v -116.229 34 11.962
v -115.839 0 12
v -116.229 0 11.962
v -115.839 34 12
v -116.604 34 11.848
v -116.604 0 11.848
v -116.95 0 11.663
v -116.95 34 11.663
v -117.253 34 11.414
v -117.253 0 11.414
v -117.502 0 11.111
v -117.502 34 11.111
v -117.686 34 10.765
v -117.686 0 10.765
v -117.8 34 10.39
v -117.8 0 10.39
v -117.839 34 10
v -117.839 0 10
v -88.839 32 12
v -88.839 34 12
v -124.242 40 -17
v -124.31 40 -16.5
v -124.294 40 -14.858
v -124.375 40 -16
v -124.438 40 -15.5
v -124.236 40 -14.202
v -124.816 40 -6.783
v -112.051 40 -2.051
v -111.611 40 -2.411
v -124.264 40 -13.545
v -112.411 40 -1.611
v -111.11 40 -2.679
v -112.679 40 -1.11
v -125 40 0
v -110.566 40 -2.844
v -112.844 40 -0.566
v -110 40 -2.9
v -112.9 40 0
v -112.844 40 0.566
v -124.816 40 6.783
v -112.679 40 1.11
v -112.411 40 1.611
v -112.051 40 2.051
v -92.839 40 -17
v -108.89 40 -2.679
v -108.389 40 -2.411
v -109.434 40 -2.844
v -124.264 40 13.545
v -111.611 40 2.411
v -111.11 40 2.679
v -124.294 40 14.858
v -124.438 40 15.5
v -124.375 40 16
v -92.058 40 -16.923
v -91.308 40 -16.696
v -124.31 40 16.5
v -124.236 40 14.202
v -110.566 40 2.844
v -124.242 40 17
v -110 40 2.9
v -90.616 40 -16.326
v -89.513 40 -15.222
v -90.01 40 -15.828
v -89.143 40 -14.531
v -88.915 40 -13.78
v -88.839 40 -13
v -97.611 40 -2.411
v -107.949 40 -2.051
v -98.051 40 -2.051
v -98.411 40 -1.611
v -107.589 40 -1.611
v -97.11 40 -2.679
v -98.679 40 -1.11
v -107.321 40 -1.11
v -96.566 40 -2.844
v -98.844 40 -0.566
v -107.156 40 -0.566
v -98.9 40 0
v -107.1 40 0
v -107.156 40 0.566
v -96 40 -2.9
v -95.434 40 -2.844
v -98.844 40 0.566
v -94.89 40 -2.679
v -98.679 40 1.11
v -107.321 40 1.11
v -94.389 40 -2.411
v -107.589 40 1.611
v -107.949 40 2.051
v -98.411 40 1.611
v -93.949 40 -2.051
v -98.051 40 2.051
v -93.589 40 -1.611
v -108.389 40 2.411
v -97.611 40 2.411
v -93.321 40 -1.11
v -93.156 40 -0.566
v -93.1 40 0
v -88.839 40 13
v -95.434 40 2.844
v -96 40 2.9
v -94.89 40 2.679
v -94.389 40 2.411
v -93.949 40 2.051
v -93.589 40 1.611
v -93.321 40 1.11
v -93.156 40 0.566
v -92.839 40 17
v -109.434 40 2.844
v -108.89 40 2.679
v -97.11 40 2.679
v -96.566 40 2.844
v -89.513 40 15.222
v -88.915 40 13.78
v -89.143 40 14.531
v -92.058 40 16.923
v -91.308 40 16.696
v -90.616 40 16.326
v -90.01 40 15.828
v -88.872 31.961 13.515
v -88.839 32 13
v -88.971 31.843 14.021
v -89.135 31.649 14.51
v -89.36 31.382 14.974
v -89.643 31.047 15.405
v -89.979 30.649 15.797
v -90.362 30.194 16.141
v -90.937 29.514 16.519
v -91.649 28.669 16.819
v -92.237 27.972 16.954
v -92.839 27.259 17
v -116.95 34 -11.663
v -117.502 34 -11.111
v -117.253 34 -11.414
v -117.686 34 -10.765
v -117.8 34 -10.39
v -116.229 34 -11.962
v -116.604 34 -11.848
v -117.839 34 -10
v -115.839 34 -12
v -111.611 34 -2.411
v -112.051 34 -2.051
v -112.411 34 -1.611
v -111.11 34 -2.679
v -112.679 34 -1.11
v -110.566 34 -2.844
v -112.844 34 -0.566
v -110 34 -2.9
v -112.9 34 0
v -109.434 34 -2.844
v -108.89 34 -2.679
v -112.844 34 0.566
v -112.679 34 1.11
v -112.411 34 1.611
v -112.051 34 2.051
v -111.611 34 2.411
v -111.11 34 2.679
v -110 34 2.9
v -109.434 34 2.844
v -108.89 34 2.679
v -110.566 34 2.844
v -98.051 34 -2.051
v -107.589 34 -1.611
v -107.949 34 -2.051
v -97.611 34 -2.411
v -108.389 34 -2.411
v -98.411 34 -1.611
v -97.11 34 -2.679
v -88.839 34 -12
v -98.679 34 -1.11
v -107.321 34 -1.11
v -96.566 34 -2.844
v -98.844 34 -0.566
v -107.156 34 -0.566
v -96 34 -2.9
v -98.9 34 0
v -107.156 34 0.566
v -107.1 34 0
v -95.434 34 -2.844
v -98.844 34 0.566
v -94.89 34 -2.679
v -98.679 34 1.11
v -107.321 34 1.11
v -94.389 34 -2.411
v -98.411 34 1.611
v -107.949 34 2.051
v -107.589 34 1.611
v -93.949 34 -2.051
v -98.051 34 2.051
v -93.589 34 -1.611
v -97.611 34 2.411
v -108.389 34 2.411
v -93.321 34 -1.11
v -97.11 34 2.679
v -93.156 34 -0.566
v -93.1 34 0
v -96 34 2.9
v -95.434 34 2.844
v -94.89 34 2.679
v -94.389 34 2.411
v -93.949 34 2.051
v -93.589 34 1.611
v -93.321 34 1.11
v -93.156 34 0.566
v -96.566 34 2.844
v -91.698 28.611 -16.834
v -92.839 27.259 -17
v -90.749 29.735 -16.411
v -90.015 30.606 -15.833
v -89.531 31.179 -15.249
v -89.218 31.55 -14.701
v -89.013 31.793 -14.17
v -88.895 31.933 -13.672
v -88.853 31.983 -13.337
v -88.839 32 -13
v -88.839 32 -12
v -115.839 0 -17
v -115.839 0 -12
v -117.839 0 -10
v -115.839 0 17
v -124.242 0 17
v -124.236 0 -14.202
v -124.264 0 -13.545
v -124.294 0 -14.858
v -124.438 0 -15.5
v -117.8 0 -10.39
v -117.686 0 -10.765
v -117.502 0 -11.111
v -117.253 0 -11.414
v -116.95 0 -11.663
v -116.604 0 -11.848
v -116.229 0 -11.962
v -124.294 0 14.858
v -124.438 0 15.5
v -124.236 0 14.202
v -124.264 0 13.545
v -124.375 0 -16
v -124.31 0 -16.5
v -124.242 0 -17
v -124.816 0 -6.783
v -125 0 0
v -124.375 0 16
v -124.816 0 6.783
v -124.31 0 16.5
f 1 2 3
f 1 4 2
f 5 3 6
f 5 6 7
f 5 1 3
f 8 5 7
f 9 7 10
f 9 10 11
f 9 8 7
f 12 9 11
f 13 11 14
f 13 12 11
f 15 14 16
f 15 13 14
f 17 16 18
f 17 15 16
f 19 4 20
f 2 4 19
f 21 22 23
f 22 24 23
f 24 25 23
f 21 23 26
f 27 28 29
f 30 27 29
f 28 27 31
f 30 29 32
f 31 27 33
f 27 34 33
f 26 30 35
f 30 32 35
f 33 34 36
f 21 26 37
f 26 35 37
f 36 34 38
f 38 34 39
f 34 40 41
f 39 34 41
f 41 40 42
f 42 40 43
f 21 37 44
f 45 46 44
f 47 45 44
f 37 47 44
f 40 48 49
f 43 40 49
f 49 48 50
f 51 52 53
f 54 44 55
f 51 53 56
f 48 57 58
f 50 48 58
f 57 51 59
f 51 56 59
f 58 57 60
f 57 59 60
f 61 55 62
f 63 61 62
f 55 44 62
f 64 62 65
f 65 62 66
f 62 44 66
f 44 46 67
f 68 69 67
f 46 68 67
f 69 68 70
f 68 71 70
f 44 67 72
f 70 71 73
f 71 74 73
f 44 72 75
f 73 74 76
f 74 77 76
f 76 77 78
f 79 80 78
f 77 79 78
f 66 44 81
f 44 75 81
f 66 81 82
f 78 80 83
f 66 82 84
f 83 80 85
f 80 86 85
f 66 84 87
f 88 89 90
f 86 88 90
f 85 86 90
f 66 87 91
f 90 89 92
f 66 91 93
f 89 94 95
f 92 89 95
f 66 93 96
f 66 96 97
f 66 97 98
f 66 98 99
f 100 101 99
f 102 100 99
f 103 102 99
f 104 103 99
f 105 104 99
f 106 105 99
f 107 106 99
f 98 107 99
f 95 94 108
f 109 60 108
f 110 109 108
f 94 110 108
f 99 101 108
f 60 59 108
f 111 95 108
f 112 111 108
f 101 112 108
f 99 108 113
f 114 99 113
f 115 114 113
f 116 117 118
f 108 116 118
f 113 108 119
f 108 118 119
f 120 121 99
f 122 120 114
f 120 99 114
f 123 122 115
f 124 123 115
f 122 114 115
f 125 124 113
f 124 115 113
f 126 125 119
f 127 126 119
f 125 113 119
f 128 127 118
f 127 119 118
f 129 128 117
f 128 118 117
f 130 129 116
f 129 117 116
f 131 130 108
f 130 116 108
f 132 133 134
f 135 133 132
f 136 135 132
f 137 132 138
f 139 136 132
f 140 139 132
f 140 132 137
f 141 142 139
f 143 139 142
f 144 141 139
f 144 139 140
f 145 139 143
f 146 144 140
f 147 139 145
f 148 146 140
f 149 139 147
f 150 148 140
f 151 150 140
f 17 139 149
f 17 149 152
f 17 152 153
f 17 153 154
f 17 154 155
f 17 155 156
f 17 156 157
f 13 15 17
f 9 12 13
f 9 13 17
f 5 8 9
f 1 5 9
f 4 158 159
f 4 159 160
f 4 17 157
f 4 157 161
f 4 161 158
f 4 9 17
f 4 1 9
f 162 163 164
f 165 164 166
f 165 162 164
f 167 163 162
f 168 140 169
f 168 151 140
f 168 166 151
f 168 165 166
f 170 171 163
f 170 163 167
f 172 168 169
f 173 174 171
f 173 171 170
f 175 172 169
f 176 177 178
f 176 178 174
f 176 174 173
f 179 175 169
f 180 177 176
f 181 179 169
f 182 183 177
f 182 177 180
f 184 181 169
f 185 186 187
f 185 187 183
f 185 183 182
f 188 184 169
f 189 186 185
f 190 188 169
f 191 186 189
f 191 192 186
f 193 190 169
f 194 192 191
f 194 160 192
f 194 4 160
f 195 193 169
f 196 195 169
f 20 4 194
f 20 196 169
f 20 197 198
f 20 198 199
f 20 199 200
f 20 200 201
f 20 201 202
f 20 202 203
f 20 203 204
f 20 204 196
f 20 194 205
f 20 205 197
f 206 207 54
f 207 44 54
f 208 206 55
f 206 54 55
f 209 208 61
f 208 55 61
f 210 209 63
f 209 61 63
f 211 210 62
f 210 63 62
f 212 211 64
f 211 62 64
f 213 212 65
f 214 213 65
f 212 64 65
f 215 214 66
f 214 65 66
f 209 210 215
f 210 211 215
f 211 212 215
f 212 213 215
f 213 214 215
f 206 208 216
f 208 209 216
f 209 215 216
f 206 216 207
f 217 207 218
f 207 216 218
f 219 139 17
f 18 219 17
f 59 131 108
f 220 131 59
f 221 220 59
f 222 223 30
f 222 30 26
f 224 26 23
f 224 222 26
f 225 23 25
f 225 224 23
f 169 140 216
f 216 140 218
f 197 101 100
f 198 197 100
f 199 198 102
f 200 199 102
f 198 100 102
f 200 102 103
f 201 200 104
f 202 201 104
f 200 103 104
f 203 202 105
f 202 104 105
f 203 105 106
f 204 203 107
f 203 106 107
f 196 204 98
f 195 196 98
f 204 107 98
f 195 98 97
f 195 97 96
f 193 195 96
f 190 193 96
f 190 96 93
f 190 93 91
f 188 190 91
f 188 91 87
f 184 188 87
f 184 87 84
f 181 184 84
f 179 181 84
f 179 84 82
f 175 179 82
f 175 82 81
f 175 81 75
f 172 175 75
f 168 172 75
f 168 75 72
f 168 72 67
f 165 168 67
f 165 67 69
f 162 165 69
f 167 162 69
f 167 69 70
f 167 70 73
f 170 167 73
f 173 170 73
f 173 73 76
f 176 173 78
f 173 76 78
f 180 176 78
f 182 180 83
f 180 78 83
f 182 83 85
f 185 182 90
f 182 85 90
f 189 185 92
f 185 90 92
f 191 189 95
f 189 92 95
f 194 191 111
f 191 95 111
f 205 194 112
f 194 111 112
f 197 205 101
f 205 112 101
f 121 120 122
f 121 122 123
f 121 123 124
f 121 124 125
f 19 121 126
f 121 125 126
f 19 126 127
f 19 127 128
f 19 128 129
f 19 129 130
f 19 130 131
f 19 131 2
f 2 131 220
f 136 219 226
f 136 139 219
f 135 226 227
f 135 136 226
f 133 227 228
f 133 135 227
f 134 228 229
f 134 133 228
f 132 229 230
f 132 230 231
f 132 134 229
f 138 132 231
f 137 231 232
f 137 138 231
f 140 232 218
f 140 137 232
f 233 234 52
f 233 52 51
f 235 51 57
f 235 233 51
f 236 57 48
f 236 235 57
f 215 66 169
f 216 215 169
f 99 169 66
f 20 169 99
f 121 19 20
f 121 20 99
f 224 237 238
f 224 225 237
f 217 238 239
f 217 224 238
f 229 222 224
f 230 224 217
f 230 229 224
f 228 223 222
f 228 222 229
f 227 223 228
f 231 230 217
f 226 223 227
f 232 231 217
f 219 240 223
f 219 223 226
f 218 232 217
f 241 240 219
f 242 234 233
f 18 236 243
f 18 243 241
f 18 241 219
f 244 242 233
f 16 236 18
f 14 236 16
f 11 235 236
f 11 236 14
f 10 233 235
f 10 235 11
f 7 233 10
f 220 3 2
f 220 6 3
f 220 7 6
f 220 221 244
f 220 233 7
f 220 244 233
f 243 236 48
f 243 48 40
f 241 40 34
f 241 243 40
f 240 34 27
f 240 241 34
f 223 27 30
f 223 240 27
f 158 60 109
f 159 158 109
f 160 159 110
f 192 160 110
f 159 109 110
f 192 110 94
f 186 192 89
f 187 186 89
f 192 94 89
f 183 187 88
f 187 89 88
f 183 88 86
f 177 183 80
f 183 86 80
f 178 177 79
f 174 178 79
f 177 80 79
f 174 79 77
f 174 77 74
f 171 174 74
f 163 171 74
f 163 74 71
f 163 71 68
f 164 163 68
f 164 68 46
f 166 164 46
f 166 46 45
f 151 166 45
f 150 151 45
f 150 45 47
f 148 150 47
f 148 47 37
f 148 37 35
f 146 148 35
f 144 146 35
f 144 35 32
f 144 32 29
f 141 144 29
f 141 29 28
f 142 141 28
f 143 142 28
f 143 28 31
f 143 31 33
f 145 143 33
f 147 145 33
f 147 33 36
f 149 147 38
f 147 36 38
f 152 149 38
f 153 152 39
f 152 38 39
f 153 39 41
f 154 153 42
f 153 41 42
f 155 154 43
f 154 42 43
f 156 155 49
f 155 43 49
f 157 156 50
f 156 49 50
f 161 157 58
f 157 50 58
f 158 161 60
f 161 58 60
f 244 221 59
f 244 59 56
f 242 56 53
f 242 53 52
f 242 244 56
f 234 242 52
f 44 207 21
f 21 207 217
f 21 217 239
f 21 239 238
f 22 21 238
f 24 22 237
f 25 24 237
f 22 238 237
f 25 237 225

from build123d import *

# Parameters (mm, degrees)
BOSS_EXTRUDE1_DEPTH = 40
CUT_EXTRUDE1_REACH  = 137.577
SKETCH3_W           = 29
SKETCH3_H           = 24
CUT_EXTRUDE2_DEPTH  = 34
SKETCH6_R           = 2.9
CUT_EXTRUDE3_DEPTH  = 31
FILLET2_R           = 4
BOSS_EXTRUDE3_START = -40
BOSS_EXTRUDE3_DEPTH = 40
FILLET4_R           = 5
FILLET5_R           = 2


with BuildPart() as part:
    # Sketch1 → Boss-Extrude1 (new body)
    with BuildSketch(Plane(origin=(0, 0, 0), x_dir=(1, 0, 0), z_dir=(0, 1, 0))):
        with BuildLine():
            Line((-123.838604643, 17), (-88.838604643, 17))
            Line((-88.838604643, 17), (-88.838604643, -17))
            Line((-88.838604643, -17), (-123.838604643, -17))
            ThreePointArc((-123.838604643, -17), (-125, 0), (-123.838604643, 17))
        make_face()
    extrude(amount=BOSS_EXTRUDE1_DEPTH)

    # Sketch2 → Cut-Extrude1 (cut, up to next)
    with BuildSketch(Plane.XY.offset(17), mode=Mode.PRIVATE) as cut_extrude1_sk1:
        Polygon((-88.838604643, 0), (-88.838604643, 32), (-115.838604643, 0), align=None)
    cut_extrude1_tool1 = extrude(cut_extrude1_sk1.sketch, amount=-CUT_EXTRUDE1_REACH, mode=Mode.PRIVATE) & part.part
    add(cut_extrude1_tool1.solids().sort_by_distance((-97.838605, 10.666667, 17))[0], mode=Mode.SUBTRACT)

    # Sketch3 → Cut-Extrude2 (cut)
    with BuildSketch(Plane.XZ):
        with Locations((-103.338604643, 0)):
            Rectangle(SKETCH3_W, SKETCH3_H)
    extrude(amount=-CUT_EXTRUDE2_DEPTH, mode=Mode.SUBTRACT)

    # Sketch6 → Cut-Extrude3 (cut)
    with BuildSketch(Plane(origin=(0, 40, 0), x_dir=(1, 0, 0), z_dir=(0, 1, 0))):
        with Locations(Location((-110, 0, 0), (0, 0, 270))):
            Circle(SKETCH6_R)
        with Locations(Location((-96, 0, 0), (0, 0, 270))):
            Circle(SKETCH6_R)
    extrude(amount=-CUT_EXTRUDE3_DEPTH, mode=Mode.SUBTRACT)

    # Fillet2
    fillet2_edges = [part.edges().sort_by_distance(p)[0] for p in [
        (-88.838604643, 36, -17),
        (-88.838604643, 36, 17),
    ]]
    fillet(fillet2_edges, radius=FILLET2_R)

    # Sketch8 → Boss-Extrude3 (add)
    with BuildSketch(Plane(origin=(0, 40, 0), x_dir=(1, 0, 0), z_dir=(0, 1, 0)).offset(BOSS_EXTRUDE3_START)):
        with BuildLine():
            Line((-123.838604643, 17), (-124.242343829, 17))
            ThreePointArc((-124.242343829, 17), (-124.342622992, 16.250295609), (-124.438378324, 15.5))
            Line((-124.438378324, 15.5), (-124.03527724, 15.5))
            ThreePointArc((-124.03527724, 15.5), (-123.93921022, 16.250297537), (-123.838604643, 17))
        make_face()
        with BuildLine():
            Line((-124.438378324, -15.5), (-124.03527724, -15.5))
            ThreePointArc((-124.03527724, -15.5), (-123.93921022, -16.250297537), (-123.838604643, -17))
            Line((-123.838604643, -17), (-124.242343829, -17))
            ThreePointArc((-124.242343829, -17), (-124.342622992, -16.250295609), (-124.438378324, -15.5))
        make_face()
    extrude(amount=BOSS_EXTRUDE3_DEPTH)

    # Fillet4
    # the kernel refuses this fillet: 5 mm, written as the material it adds along each edge
    with BuildSketch(Plane(origin=(-124.03527724, 0, 15.5), x_dir=(-0.11618374288163974, 0, -0.9932277371731083), z_dir=(0, 1, 0))) as fillet4_piece_1:
        with BuildLine():
            CenterArc((2.007660221, 4.99984503), FILLET4_R, 246.910702944, 22.638192563)
            Line((0.046833793, 0.400371178), (0.007617264, 0.308381701))
            ThreePointArc((0.007617264, 0.308381701), (-0.075905877, 0.211803963), (-0.099322774, 0.011618374))
            Line((-0.099322774, 0.011618374), (0.000787318, -0.099996901))
            ThreePointArc((0.000787318, -0.099996901), (0.984147167, -0.096125757), (1.967507016, -0.099996901))
            Line((1.967507016, -0.099996901), (1.968294334, 0))
        make_face()
    extrude(amount=40)
    with BuildSketch(Plane(origin=(-124.03527724, 0, -15.5), x_dir=(-1, 0, 0), z_dir=(0, 1, 0))) as fillet4_piece_2:
        with BuildLine():
            CenterArc((5.199242245, 1.413163109), FILLET4_R, 173.779198266, 22.638192563)
            Line((0.228683803, 1.954964528), (0.129272634, 1.965800556))
            ThreePointArc((0.129272634, 1.965800556), (0.018867133, 0.988650514), (-0.099228222, 0.0124))
            Line((-0.099228222, 0.0124), (0, -0.1))
            ThreePointArc((0, -0.1), (0.201550542, -0.1), (0.307178261, -0.028263262))
            Line((0.307178261, -0.028263262), (0.403101084, 0))
        make_face()
    extrude(amount=40)

    # Fillet5
    fillet5_edges = [part.edges().sort_by_distance(p)[0] for p in [
        (-117.838604643, 17, 12),
        (-117.838604643, 17, -12),
    ]]
    fillet(fillet5_edges, radius=FILLET5_R)


solid = part.part
